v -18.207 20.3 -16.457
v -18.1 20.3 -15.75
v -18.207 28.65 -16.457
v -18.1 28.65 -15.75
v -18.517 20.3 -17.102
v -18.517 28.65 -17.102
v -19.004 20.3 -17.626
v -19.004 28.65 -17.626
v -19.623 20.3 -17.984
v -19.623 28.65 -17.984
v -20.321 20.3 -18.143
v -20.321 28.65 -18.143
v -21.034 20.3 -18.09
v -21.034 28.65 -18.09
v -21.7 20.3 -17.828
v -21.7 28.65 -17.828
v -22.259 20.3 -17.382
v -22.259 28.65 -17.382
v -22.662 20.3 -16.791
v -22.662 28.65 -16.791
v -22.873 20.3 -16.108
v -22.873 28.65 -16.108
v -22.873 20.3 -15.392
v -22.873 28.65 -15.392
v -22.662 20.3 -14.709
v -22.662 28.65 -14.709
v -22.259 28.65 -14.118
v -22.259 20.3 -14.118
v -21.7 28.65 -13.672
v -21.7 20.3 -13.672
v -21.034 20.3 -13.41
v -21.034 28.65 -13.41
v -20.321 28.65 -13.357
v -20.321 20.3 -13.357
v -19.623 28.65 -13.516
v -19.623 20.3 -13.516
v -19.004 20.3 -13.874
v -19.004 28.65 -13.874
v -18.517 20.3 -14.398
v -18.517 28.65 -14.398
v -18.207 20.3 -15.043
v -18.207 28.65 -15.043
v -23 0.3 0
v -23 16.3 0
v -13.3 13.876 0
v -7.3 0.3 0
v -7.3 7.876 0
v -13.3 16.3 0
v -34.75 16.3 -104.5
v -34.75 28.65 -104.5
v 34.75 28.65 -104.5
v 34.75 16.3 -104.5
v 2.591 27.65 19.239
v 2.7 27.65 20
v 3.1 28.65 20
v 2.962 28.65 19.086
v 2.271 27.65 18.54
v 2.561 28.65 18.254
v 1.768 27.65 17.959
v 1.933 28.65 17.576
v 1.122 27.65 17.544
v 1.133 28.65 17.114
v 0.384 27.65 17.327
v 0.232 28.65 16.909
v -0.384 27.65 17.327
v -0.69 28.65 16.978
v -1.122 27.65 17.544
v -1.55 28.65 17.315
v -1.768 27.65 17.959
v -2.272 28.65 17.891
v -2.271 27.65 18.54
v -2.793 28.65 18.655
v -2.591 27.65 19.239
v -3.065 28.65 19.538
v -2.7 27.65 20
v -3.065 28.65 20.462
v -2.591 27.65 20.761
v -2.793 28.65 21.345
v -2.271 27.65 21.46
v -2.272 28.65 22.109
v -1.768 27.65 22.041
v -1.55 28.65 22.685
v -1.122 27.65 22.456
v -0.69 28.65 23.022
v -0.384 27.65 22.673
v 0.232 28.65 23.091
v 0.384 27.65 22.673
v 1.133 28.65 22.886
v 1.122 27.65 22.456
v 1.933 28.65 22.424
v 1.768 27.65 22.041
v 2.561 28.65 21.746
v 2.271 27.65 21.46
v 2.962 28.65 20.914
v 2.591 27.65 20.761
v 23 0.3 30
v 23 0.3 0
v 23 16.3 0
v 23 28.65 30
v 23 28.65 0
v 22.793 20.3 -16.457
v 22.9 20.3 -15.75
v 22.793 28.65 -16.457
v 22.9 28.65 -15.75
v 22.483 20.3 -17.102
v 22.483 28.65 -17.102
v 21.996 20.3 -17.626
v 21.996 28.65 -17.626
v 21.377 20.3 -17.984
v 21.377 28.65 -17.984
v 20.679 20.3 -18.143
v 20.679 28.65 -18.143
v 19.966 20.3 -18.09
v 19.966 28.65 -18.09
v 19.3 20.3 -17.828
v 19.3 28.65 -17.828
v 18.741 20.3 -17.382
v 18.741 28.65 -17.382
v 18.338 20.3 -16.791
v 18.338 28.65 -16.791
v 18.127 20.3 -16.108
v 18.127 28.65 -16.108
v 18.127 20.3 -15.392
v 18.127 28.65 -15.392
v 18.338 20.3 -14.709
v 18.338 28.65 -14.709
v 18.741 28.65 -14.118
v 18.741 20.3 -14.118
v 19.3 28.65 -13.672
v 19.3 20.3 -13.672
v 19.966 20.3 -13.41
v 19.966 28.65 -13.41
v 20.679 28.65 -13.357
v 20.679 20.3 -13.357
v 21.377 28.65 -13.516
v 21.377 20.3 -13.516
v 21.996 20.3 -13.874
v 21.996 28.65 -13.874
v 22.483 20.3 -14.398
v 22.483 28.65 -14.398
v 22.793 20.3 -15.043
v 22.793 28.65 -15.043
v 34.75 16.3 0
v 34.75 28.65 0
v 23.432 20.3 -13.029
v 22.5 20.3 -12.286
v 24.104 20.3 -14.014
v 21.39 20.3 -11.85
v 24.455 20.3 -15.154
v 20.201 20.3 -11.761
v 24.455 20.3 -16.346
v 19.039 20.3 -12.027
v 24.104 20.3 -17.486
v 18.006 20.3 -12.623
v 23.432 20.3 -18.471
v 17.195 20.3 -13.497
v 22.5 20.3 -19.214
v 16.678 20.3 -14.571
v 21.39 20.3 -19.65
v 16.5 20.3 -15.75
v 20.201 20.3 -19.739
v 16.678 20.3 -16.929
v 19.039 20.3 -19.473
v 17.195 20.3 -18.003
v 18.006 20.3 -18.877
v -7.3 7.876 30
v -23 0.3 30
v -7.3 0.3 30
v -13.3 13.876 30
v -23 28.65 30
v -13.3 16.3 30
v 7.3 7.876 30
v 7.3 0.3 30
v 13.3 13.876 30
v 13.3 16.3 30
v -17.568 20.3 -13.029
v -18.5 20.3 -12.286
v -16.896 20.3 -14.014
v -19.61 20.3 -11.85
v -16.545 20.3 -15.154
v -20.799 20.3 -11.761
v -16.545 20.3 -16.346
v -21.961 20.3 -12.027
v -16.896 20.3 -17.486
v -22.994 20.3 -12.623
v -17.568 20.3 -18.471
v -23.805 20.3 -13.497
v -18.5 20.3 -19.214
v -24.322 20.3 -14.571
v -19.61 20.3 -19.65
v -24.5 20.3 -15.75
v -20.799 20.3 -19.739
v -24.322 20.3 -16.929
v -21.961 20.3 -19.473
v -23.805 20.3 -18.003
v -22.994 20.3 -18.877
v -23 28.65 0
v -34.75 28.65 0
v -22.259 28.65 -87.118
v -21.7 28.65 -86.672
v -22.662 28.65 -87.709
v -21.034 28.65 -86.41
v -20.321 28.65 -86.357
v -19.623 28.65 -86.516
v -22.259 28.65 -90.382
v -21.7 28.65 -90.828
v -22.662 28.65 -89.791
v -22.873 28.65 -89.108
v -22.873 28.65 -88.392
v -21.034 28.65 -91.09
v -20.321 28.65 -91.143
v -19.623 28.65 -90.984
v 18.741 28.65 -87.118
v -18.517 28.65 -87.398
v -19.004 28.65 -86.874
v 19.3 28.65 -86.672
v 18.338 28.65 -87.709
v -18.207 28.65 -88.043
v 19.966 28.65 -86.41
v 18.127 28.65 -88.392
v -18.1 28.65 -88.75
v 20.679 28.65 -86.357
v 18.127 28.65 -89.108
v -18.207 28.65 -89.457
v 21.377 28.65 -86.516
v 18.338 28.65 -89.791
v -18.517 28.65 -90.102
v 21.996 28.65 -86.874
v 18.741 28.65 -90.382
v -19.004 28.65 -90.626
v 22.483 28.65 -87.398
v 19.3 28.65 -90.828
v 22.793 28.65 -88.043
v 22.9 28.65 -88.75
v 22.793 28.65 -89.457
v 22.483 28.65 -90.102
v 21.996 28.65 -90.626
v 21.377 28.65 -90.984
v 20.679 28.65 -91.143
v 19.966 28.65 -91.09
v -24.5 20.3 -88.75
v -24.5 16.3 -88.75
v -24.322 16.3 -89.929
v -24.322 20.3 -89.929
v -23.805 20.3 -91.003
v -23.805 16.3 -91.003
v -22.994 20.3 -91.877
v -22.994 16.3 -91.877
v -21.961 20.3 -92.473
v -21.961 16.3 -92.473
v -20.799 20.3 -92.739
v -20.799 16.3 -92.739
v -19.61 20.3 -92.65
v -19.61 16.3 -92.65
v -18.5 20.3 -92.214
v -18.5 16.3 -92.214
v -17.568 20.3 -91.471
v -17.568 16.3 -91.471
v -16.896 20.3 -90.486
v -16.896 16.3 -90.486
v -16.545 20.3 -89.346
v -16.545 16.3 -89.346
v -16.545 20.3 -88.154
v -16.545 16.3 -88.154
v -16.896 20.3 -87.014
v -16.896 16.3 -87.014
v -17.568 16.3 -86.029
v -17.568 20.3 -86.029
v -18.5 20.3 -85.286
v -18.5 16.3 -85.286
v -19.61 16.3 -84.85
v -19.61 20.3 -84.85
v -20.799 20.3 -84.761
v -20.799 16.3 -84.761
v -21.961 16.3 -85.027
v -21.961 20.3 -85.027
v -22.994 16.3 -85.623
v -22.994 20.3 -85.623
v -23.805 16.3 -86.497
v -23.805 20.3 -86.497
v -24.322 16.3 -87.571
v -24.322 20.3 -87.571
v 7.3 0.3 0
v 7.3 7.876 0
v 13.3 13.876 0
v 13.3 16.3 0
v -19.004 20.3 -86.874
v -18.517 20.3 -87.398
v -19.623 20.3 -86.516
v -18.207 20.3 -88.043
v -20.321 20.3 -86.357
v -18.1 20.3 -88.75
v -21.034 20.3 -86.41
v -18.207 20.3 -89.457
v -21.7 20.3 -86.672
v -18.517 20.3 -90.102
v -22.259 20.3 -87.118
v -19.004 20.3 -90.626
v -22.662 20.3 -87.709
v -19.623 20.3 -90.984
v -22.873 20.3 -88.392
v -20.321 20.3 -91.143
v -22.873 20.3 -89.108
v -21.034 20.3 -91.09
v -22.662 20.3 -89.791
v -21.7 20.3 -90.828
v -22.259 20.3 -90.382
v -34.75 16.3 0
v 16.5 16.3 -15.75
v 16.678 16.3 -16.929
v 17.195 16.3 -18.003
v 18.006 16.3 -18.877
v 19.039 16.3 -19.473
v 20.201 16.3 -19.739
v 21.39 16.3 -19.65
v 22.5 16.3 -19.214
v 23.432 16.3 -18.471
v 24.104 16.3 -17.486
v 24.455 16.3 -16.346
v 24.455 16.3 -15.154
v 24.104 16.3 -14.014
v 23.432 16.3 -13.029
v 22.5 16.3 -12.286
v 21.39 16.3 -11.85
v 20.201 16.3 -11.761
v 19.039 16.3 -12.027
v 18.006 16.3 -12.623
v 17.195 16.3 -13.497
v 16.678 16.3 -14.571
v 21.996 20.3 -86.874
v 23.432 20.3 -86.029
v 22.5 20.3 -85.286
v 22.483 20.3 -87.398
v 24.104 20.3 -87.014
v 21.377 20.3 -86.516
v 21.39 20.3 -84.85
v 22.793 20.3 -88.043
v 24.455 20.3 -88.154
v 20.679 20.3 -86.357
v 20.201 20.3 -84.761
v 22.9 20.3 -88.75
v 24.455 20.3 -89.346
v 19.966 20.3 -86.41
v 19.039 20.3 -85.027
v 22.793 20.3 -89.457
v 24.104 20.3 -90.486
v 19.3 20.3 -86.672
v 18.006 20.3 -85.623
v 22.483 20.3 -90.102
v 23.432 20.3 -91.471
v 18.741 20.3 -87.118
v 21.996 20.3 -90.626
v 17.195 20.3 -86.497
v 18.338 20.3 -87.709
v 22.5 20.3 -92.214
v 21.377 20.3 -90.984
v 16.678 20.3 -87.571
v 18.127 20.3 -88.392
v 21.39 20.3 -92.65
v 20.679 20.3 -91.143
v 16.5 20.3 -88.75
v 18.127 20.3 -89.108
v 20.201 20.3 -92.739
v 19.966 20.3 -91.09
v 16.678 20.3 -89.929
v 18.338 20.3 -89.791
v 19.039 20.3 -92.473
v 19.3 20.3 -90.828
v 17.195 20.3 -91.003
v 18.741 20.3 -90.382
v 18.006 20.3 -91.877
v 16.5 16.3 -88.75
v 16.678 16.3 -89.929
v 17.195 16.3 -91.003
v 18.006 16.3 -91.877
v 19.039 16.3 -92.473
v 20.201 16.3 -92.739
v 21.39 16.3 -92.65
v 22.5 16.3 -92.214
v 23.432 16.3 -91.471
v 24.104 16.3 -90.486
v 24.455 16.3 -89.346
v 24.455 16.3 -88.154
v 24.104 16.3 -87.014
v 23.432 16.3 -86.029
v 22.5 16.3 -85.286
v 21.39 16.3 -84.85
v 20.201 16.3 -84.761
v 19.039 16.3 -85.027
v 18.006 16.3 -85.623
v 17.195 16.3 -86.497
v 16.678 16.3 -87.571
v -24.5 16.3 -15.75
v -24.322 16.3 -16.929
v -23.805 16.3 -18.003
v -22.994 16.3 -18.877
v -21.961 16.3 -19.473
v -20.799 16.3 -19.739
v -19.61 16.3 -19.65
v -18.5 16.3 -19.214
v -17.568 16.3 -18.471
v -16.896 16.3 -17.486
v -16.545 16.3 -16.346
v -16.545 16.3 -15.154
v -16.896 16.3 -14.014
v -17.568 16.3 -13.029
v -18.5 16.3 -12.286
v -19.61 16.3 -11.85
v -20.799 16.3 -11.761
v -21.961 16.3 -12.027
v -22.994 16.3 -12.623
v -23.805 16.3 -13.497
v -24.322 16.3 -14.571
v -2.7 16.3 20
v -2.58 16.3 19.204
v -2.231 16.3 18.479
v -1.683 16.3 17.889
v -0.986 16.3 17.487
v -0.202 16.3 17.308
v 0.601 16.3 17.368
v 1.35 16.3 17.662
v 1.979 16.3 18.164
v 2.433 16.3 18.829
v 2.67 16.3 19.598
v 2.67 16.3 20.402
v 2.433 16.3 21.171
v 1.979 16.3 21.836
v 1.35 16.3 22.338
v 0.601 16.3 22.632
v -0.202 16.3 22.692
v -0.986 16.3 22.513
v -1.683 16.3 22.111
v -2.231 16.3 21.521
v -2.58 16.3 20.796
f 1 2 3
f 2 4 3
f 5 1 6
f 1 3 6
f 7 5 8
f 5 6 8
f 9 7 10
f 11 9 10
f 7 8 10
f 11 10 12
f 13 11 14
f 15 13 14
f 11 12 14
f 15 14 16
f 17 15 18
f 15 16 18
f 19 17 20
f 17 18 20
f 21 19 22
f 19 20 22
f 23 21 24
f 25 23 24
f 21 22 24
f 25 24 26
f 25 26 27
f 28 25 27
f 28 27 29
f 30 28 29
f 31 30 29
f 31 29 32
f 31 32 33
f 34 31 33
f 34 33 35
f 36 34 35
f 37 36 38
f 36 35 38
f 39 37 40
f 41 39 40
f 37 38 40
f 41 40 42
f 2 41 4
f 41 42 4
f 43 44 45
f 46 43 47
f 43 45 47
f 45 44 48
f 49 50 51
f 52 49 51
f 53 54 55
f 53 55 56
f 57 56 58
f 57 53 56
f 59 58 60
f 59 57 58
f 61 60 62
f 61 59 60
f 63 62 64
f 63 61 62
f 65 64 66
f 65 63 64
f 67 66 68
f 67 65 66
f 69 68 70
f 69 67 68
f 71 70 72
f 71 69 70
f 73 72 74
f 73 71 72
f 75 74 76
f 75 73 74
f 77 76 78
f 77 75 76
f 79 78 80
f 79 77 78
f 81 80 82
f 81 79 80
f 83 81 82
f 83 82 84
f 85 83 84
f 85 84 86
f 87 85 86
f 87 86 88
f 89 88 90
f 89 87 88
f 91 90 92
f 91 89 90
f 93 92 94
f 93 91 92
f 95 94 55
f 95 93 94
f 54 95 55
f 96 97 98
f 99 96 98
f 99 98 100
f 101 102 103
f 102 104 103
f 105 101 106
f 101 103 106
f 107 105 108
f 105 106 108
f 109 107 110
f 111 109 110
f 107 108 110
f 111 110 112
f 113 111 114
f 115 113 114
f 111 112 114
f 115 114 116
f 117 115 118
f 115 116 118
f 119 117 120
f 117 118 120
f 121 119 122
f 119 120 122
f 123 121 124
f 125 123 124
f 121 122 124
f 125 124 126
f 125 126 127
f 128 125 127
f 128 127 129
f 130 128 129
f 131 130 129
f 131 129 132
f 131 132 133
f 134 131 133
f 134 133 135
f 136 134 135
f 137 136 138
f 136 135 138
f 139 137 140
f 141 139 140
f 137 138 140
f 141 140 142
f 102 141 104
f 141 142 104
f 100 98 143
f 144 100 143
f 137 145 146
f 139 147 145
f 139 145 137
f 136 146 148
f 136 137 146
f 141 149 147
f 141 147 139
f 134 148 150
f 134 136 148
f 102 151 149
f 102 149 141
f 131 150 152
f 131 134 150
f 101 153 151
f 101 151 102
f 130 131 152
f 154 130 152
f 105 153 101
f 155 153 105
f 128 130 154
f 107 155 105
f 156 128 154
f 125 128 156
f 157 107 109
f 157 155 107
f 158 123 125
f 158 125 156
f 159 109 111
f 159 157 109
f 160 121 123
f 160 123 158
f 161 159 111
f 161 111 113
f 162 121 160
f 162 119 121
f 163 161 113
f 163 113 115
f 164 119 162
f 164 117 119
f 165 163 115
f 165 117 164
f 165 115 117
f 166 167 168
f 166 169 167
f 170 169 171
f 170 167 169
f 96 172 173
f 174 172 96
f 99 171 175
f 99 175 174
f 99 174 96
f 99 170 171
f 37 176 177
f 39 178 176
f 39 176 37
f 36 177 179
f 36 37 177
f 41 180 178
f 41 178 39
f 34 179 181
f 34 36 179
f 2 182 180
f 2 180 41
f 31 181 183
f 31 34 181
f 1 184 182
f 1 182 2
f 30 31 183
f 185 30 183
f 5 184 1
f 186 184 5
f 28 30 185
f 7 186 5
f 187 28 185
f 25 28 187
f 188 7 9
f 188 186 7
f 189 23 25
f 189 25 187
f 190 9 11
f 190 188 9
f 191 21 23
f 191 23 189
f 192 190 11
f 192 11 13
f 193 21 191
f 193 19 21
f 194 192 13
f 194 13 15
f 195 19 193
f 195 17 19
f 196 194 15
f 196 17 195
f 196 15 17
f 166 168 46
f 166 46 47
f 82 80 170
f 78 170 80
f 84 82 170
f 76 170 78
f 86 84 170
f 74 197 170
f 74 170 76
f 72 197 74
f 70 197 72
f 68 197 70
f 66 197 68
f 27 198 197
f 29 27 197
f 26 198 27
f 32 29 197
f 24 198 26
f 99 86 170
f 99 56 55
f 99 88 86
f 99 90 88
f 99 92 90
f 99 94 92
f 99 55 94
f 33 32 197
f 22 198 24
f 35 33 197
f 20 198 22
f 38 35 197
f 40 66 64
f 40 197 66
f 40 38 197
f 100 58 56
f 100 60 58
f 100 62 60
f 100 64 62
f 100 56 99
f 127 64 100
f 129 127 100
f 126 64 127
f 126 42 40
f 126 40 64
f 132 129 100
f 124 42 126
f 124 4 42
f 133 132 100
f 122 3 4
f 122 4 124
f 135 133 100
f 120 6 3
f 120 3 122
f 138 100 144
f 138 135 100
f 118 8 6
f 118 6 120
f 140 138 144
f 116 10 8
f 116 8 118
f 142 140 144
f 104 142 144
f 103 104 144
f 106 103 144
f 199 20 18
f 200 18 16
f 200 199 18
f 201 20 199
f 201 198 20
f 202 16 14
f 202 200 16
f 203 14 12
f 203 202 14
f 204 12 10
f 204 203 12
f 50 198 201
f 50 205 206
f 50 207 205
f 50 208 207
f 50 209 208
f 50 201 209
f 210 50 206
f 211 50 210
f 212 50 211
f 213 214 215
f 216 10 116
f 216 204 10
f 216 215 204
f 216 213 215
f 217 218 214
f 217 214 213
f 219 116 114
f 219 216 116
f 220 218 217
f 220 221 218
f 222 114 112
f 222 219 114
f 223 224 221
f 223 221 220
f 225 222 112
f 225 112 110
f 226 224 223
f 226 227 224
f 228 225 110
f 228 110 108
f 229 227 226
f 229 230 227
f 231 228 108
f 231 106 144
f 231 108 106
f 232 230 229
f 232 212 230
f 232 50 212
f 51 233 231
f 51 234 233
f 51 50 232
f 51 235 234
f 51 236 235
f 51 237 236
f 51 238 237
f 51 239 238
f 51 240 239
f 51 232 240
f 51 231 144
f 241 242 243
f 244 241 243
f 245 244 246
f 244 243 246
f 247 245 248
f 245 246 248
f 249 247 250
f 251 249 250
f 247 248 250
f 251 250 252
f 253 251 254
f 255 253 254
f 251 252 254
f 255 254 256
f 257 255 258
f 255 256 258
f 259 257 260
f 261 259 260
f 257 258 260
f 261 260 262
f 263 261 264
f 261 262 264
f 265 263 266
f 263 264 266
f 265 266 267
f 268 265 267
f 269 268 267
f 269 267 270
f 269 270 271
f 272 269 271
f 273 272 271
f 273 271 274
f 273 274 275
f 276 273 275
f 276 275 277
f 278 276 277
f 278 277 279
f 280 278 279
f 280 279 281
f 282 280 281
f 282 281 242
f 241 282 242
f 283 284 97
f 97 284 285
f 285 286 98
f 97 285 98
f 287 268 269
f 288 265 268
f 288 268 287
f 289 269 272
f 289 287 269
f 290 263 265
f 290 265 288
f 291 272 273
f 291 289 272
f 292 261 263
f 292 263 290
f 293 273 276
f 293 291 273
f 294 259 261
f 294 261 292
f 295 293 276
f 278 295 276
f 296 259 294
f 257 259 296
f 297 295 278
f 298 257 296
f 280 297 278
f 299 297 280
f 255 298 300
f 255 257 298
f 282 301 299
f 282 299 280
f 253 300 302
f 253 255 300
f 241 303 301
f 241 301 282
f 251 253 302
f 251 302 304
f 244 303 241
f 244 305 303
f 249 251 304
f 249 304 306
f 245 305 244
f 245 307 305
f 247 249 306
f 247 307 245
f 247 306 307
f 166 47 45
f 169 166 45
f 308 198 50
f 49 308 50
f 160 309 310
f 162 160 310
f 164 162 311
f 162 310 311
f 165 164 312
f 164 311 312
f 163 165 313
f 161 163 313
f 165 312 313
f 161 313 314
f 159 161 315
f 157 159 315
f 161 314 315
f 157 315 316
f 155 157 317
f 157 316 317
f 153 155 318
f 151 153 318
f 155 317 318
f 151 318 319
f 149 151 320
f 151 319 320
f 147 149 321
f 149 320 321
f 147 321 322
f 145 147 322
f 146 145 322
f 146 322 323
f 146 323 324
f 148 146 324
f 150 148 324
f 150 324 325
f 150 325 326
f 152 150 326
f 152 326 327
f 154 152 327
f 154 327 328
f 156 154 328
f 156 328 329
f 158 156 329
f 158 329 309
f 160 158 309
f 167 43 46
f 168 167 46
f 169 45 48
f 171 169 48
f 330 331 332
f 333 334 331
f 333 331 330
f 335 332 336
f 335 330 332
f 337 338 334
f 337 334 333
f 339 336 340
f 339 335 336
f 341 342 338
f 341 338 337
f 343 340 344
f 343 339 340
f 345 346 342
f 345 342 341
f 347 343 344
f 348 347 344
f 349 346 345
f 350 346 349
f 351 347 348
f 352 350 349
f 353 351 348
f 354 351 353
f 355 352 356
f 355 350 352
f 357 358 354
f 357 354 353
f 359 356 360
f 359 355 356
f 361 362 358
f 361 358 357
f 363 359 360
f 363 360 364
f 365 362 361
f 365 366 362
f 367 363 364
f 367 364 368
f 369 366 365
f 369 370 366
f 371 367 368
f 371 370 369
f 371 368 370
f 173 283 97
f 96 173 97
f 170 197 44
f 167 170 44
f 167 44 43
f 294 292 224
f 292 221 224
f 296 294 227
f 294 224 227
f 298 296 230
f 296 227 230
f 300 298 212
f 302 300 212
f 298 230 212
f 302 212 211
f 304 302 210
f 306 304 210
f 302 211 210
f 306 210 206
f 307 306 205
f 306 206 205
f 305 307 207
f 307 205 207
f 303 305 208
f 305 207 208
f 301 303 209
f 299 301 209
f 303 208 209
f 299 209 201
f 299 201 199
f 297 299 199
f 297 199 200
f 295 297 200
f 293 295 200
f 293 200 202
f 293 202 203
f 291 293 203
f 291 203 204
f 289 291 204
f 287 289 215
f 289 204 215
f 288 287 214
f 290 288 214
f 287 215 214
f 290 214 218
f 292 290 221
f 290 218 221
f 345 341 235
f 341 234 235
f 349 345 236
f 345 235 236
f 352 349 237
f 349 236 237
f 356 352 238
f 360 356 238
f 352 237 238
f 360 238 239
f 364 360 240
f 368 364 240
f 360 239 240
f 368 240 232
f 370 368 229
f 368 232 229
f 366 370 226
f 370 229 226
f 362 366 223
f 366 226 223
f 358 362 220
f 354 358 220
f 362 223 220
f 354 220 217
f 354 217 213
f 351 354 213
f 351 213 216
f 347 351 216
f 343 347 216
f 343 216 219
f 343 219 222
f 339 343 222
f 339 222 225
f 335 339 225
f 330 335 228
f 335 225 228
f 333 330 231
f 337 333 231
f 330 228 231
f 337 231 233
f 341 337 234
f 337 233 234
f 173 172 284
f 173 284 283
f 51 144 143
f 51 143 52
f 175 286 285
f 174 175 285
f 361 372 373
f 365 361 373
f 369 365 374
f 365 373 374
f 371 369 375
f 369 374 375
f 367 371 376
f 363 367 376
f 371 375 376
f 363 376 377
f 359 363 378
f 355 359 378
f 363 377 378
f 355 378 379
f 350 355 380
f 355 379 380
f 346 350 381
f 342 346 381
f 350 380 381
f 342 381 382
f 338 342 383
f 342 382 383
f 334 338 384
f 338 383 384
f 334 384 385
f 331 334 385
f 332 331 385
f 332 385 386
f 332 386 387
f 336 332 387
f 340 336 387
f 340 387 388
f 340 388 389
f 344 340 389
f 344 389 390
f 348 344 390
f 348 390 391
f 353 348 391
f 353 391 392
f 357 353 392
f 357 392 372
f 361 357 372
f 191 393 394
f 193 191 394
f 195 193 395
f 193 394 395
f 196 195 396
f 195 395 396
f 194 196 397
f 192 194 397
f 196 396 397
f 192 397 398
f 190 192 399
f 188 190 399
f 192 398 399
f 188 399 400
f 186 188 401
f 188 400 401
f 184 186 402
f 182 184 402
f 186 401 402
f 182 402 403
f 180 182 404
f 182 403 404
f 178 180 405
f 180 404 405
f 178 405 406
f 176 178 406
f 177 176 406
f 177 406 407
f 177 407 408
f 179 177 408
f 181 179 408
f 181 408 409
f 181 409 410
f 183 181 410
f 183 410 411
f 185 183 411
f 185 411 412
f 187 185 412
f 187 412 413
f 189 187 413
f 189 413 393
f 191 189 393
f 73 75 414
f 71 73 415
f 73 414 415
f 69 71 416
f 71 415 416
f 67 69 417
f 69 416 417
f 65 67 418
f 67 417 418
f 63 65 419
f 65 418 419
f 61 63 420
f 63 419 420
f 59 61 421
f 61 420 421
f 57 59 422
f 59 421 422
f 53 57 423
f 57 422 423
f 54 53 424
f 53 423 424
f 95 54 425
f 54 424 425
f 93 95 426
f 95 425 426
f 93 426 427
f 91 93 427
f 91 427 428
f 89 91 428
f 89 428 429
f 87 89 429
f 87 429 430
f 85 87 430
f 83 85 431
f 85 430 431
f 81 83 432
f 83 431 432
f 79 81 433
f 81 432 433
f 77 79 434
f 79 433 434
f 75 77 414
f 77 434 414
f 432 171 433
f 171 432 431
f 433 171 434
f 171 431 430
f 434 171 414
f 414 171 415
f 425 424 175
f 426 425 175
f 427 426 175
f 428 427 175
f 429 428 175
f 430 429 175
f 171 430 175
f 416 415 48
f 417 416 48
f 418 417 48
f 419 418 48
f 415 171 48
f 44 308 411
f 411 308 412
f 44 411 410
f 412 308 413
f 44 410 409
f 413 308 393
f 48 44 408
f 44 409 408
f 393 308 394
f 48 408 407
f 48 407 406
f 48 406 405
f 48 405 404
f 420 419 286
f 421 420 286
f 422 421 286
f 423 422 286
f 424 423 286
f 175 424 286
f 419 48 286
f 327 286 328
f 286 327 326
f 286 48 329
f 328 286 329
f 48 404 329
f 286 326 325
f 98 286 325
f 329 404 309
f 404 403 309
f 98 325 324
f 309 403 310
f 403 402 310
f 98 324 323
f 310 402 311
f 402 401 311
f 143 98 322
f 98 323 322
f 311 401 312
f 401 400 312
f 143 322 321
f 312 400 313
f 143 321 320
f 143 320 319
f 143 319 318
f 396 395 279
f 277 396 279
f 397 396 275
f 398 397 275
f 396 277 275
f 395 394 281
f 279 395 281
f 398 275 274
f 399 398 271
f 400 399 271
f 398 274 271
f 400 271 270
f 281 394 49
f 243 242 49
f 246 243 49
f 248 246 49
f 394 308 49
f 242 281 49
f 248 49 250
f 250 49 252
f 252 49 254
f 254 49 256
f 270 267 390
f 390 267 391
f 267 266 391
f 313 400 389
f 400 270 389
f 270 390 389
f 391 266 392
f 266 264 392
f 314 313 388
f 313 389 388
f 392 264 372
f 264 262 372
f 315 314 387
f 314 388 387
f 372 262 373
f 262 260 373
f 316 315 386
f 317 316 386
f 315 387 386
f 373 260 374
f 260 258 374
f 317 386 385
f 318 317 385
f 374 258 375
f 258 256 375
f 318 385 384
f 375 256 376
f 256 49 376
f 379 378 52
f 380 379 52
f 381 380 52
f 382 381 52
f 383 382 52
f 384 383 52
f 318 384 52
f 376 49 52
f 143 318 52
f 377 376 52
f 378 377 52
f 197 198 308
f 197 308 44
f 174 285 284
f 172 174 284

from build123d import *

# Parameters (mm, degrees)
BOSS_EXTRUDE1_DEPTH            = 30
HOLE1_D                        = 5.4
HOLE1_CBORE_D                  = 6.2
HOLE1_CBORE_DEPTH              = 1
CHAMFER1_SIZE2                 = 0.4
CHAMFER1_SIZE                  = 1
SKETCH5_W                      = 69.5
SKETCH5_H                      = 104.5
BOSS_EXTRUDE2_DEPTH            = 12.35
CBORE_FOR_M4_SHCS1_D           = 4.8
CBORE_FOR_M4_SHCS1_CBORE_D     = 8
CBORE_FOR_M4_SHCS1_CBORE_DEPTH = 4


with BuildPart() as part:
    # Sketch1 → Boss-Extrude1 (new body)
    with BuildSketch(Plane.XY):
        Polygon((-7.3, 0.3), (-7.3, 7.875735931), (-13.3, 13.875735931), (-13.3, 16.3), (13.3, 16.3), (13.3, 13.875735931), (7.3, 7.875735931), (7.3, 0.3), (23, 0.3), (23, 28.65), (-23, 28.65), (-23, 0.3), align=None)
    extrude(amount=BOSS_EXTRUDE1_DEPTH)

    # Hole1 (through all)
    with Locations(Plane(origin=(0, 28.65, 0), x_dir=(1, 0, 0), z_dir=(0, 1, 0))):
        with Locations((0, -20)):
            CounterBoreHole(HOLE1_D / 2, HOLE1_CBORE_D / 2, HOLE1_CBORE_DEPTH)

    # Chamfer1
    chamfer1_edges = [part.edges().sort_by_distance(p)[0] for p in [
        (-3.1, 27.65, 20),
    ]]
    chamfer1_side = [part.faces().sort_by_distance(p)[0] for p in [
        (-3.1, 27.658, 20),
    ]]
    chamfer(chamfer1_edges, length=CHAMFER1_SIZE - 0.0001, length2=CHAMFER1_SIZE2 - 0.0001, reference=chamfer1_side[0])  # a hair under: the kernel refuses the full size

    # Sketch5 → Boss-Extrude2 (add)
    with BuildSketch(Plane(origin=(0, 28.65, 0), x_dir=(1, 0, 0), z_dir=(0, 1, 0))):
        with Locations((0, 52.25)):
            Rectangle(SKETCH5_W, SKETCH5_H)
    extrude(amount=-BOSS_EXTRUDE2_DEPTH)

    # CBORE for M4 SHCS1 (through all)
    with Locations(Plane(origin=(0, 16.3, 0), x_dir=(-1, 0, 0), z_dir=(0, -1, 0))):
        with Locations((-20.5, 88.75), (20.5, 88.75), (-20.5, 15.75), (20.5, 15.75)):
            CounterBoreHole(CBORE_FOR_M4_SHCS1_D / 2, CBORE_FOR_M4_SHCS1_CBORE_D / 2, CBORE_FOR_M4_SHCS1_CBORE_DEPTH)


solid = part.part
